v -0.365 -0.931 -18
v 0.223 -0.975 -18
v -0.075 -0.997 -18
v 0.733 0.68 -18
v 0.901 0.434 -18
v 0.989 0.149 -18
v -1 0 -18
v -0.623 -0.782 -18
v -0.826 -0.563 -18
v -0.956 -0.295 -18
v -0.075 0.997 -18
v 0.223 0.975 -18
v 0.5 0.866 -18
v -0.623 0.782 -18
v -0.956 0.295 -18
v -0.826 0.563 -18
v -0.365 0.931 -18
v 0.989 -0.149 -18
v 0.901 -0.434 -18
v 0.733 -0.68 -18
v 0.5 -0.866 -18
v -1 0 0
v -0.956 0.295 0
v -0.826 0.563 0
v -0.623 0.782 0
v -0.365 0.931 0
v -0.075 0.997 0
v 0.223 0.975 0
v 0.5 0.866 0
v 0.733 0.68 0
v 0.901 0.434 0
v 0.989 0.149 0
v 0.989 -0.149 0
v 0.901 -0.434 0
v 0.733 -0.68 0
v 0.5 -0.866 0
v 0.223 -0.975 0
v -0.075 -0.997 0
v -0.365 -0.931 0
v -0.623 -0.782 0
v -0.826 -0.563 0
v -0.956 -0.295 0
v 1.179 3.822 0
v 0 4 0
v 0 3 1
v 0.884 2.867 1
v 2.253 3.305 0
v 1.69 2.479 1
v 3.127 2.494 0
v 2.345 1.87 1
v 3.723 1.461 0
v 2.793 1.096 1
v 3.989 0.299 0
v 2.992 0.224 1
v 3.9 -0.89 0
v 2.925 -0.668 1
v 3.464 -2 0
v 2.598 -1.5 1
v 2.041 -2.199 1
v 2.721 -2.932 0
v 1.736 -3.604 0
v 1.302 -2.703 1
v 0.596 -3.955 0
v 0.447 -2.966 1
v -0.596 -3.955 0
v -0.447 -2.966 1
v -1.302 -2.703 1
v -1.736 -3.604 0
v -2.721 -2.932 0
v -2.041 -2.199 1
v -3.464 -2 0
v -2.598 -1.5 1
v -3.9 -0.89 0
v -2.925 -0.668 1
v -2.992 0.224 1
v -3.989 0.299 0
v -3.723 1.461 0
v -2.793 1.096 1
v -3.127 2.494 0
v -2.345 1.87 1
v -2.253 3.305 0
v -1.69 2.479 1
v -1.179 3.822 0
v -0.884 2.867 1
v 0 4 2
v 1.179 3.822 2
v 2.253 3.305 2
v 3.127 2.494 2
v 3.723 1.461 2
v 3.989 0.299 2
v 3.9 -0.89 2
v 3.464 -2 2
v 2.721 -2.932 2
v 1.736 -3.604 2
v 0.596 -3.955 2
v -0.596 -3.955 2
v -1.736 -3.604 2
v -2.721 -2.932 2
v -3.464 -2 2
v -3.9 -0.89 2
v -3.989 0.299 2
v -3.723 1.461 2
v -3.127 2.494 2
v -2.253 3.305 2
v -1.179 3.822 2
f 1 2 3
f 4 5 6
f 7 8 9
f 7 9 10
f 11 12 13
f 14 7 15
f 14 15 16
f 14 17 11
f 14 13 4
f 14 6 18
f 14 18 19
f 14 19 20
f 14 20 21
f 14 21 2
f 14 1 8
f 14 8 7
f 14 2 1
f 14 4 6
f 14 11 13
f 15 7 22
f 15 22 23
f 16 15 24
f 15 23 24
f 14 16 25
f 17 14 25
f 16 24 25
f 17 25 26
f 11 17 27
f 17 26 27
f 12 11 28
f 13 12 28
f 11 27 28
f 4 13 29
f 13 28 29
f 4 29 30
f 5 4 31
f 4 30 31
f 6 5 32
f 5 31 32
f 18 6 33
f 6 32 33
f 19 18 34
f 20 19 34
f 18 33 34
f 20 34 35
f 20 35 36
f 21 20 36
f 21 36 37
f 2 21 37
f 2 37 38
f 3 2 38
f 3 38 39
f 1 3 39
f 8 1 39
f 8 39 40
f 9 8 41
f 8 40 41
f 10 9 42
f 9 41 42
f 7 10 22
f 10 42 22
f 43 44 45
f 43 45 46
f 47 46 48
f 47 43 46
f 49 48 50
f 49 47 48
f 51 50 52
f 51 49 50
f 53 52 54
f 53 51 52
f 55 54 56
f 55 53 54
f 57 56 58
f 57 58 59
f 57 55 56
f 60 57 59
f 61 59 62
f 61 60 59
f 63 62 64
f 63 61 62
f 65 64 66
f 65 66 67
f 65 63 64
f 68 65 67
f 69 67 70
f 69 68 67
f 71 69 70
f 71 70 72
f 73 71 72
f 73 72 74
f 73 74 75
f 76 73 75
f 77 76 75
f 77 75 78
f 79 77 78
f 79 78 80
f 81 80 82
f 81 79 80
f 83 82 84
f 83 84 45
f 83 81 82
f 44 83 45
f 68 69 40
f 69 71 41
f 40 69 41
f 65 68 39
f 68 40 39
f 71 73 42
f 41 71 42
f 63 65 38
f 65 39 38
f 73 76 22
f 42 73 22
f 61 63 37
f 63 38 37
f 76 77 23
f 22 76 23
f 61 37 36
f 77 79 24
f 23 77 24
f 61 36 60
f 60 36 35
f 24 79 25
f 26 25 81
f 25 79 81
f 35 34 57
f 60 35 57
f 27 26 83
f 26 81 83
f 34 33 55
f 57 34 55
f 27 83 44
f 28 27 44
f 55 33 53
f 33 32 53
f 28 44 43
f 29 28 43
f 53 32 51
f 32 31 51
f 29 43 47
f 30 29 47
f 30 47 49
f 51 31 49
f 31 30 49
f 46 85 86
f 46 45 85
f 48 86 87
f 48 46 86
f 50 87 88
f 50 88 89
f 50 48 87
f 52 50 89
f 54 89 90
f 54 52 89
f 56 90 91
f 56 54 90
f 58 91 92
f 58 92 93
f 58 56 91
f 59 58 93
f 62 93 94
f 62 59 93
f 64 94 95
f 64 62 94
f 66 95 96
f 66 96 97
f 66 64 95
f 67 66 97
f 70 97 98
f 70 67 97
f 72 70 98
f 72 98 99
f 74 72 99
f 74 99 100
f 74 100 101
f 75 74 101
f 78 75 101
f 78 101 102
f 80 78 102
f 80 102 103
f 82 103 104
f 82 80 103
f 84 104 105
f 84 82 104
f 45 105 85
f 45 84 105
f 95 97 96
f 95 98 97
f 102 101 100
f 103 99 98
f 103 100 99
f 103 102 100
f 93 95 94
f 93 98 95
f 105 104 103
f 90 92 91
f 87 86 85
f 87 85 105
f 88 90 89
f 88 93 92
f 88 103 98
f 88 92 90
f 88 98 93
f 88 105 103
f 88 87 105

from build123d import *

# Parameters (mm, degrees)
SKETCH1_R           = 4
BOSS_EXTRUDE1_DEPTH = 2
SKETCH2_R           = 1
BOSS_EXTRUDE2_DEPTH = 18


with BuildPart() as part:
    # Sketch1 → Boss-Extrude1 (new body)
    with BuildSketch(Plane.XY):
        Circle(SKETCH1_R)
    extrude(amount=BOSS_EXTRUDE1_DEPTH)

    # Sketch2 → Boss-Extrude2 (add)
    with BuildSketch(Plane(origin=(0, 0, 0), x_dir=(-1, 0, 0), z_dir=(0, 0, -1))):
        Circle(SKETCH2_R)
    extrude(amount=BOSS_EXTRUDE2_DEPTH)

    # Sketch3 → Cut-Revolve1 (revolve, cut)
    with BuildSketch(Plane(origin=(0, 0, 0), x_dir=(0, 0, -1), z_dir=(1, 0, 0))):
        Polygon((-2, 4), (-1, 3), (0, 4), align=None)
    revolve(axis=Axis((0, 0, 3.115097116), (0, 0, -1)), mode=Mode.SUBTRACT)


solid = part.part
